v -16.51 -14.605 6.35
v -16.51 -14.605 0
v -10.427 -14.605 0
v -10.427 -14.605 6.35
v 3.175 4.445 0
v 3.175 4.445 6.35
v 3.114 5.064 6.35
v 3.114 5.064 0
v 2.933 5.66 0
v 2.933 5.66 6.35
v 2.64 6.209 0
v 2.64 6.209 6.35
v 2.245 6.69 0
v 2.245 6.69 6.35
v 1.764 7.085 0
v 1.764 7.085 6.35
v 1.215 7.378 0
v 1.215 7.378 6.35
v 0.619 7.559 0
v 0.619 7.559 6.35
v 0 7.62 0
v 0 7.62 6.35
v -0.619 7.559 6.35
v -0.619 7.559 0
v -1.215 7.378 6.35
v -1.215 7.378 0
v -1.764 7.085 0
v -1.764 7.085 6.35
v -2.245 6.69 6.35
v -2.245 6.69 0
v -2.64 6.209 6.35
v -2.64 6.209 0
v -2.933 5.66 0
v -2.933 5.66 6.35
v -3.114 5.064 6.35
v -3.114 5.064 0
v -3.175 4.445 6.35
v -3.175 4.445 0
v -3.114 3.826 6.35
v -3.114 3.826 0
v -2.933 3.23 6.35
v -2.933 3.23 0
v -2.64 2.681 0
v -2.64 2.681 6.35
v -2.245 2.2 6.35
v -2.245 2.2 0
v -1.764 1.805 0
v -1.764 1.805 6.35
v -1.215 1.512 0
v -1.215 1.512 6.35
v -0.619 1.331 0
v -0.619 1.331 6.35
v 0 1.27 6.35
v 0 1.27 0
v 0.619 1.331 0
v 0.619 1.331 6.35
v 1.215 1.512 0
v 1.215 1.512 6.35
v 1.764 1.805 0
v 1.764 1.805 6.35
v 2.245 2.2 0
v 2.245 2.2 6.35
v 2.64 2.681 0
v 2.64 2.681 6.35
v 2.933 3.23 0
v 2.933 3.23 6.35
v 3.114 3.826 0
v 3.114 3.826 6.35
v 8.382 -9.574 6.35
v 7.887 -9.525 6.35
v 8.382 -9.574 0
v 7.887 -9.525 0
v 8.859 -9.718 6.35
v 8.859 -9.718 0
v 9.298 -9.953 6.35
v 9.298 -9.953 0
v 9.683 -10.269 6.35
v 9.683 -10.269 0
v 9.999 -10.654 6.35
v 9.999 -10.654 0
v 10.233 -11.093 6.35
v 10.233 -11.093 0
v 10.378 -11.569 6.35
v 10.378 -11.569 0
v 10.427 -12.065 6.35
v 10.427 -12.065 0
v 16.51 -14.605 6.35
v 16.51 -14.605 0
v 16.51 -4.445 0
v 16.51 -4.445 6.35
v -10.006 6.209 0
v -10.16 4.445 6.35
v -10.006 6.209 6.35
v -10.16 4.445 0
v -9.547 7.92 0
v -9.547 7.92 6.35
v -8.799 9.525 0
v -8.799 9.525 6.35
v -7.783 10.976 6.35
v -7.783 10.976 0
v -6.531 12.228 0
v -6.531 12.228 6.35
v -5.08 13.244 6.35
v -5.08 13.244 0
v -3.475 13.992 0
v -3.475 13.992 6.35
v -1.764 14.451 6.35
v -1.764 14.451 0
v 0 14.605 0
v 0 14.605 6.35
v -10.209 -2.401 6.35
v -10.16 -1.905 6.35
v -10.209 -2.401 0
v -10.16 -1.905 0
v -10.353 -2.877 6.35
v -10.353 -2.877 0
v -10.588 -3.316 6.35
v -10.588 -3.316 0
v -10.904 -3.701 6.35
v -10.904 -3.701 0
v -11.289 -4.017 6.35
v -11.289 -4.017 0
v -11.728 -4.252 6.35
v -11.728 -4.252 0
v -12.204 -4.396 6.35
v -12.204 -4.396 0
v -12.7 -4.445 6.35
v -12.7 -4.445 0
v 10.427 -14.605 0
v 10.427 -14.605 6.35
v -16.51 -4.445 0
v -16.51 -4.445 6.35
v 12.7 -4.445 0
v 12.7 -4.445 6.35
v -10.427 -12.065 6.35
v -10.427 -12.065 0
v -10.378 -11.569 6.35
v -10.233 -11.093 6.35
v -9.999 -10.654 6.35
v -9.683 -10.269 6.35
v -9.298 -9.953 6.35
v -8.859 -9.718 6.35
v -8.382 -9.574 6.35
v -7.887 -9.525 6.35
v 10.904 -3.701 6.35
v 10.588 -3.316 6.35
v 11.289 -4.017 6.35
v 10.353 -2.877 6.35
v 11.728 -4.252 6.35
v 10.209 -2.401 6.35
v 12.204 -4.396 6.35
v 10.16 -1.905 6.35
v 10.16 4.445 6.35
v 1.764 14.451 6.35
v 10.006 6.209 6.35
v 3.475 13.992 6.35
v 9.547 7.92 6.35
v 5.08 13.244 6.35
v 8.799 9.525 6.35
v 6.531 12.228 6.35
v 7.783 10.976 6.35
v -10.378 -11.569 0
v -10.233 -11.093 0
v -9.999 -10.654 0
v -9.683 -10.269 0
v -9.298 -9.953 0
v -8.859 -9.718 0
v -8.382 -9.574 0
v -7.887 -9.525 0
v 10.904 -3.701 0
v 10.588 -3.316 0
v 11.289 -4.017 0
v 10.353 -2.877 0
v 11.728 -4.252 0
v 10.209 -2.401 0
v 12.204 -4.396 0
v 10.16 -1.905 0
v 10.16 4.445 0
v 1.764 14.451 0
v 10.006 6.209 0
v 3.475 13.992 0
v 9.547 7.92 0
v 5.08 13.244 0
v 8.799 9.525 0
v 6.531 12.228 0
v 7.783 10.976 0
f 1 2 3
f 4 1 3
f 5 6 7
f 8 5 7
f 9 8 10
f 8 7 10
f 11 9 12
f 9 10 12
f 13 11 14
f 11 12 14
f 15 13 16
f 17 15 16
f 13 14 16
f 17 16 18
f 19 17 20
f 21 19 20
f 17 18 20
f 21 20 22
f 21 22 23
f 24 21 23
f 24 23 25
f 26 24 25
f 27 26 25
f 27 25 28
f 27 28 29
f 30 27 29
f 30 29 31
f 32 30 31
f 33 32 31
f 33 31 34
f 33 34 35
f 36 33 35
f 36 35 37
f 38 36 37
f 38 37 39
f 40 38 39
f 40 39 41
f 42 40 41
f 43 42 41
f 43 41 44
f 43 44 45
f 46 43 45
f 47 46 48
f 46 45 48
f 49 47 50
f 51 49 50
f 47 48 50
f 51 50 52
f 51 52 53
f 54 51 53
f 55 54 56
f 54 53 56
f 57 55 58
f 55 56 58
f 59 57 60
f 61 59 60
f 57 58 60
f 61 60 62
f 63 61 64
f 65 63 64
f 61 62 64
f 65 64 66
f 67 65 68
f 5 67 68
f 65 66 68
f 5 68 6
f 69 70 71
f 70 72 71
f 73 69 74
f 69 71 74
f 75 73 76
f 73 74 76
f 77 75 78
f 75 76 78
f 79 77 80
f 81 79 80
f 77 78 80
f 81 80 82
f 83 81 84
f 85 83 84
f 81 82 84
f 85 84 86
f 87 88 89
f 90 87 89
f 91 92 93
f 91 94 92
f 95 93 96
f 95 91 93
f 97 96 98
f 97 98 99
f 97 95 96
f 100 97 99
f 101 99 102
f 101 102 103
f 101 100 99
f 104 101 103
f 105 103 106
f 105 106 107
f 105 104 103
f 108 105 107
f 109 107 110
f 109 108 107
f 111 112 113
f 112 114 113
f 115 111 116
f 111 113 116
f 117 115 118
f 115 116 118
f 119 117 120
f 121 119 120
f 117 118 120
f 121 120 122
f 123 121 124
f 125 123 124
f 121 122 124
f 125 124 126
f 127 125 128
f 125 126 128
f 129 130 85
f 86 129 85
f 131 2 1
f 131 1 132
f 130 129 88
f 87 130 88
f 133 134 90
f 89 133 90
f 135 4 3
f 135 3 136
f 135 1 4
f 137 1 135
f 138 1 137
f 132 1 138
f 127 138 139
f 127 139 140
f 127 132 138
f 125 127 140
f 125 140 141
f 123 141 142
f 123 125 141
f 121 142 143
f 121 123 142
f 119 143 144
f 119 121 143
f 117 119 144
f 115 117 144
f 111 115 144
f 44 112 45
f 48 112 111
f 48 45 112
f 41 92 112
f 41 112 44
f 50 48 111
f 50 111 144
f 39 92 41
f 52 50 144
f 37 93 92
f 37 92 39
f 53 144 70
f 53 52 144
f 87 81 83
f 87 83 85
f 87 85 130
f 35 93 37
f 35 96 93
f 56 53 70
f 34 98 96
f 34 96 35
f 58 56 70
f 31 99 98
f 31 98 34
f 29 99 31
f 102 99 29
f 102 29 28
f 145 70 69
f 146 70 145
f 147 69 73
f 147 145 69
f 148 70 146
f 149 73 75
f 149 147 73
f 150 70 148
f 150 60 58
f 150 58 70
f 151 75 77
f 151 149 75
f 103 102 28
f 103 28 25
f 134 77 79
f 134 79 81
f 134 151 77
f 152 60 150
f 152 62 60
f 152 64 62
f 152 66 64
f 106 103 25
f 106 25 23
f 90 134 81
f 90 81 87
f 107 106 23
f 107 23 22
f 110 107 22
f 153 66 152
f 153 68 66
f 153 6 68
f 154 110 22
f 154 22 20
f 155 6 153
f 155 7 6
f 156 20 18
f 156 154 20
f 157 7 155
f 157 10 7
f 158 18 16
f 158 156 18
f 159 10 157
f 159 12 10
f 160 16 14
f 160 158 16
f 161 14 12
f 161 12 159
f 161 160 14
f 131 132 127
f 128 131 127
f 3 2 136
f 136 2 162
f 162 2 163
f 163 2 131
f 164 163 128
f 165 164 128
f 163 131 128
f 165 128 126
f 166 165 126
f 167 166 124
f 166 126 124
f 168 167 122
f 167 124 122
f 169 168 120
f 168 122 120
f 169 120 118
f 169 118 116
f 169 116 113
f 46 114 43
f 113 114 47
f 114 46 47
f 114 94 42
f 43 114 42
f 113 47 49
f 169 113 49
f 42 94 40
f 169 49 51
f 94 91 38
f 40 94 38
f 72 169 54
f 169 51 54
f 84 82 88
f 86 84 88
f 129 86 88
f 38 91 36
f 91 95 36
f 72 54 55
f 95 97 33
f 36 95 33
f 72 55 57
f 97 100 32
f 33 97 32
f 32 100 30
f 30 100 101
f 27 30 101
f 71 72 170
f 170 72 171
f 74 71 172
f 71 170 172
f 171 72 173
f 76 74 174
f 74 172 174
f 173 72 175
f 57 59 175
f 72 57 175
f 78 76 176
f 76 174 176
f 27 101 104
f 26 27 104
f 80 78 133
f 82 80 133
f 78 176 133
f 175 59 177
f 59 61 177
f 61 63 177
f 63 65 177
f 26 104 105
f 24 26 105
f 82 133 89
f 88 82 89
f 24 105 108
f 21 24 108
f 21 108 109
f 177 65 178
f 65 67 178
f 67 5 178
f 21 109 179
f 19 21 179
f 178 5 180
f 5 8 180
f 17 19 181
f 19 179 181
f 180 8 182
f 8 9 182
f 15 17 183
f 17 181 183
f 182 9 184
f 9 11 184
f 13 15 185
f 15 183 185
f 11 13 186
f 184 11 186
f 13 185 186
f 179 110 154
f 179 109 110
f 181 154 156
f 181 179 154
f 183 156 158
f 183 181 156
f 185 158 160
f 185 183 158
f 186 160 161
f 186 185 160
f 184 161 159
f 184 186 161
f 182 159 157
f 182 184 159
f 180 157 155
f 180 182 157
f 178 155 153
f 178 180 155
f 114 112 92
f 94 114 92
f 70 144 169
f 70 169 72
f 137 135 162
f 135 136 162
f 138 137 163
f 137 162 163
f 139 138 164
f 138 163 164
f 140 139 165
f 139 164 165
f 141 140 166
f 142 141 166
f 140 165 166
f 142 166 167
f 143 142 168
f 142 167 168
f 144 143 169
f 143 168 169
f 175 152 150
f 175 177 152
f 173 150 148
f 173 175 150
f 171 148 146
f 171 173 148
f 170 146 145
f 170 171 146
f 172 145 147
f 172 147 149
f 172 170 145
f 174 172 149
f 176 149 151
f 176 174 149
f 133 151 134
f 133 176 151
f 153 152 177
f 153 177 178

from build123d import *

# Parameters (mm, degrees)
SKETCH1_W           = 33.02
SKETCH1_H           = 29.21
BOSS_EXTRUDE1_DEPTH = 6.35
CUT_EXTRUDE1_REACH  = 24.939
SKETCH3_R           = 3.175
SKETCH3_W           = 6.35
SKETCH3_H           = 19.05
SKETCH3_W_2         = 20.8534
SKETCH3_H_2         = 5.08
FILLET1_R           = 10.16
FILLET2_R           = 2.54


with BuildPart() as part:
    # Sketch1 → Boss-Extrude1 (new body)
    with BuildSketch(Plane.XY):
        Rectangle(SKETCH1_W, SKETCH1_H)
    extrude(amount=BOSS_EXTRUDE1_DEPTH)

    # Sketch3 → Cut-Extrude1 (cut, up to next)
    with BuildSketch(Plane.XY.offset(6.35), mode=Mode.PRIVATE) as cut_extrude1_sk1:
        with Locations((0, 4.445)):
            Circle(SKETCH3_R)
    cut_extrude1_tool1 = extrude(cut_extrude1_sk1.sketch, amount=-CUT_EXTRUDE1_REACH, mode=Mode.PRIVATE) & part.part
    # Sketch3 → Cut-Extrude1 (cut, up to next)
    with BuildSketch(Plane.XY.offset(6.35), mode=Mode.PRIVATE) as cut_extrude1_sk2:
        with Locations((-13.335, 5.08)):
            Rectangle(SKETCH3_W, SKETCH3_H)
    cut_extrude1_tool2 = extrude(cut_extrude1_sk2.sketch, amount=-CUT_EXTRUDE1_REACH, mode=Mode.PRIVATE) & part.part
    # Sketch3 → Cut-Extrude1 (cut, up to next)
    with BuildSketch(Plane.XY.offset(6.35), mode=Mode.PRIVATE) as cut_extrude1_sk3:
        with Locations((13.335, 5.08)):
            Rectangle(SKETCH3_W, SKETCH3_H)
    cut_extrude1_tool3 = extrude(cut_extrude1_sk3.sketch, amount=-CUT_EXTRUDE1_REACH, mode=Mode.PRIVATE) & part.part
    # Sketch3 → Cut-Extrude1 (cut, up to next)
    with BuildSketch(Plane.XY.offset(6.35), mode=Mode.PRIVATE) as cut_extrude1_sk4:
        with Locations((0, -12.065)):
            Rectangle(SKETCH3_W_2, SKETCH3_H_2)
    cut_extrude1_tool4 = extrude(cut_extrude1_sk4.sketch, amount=-CUT_EXTRUDE1_REACH, mode=Mode.PRIVATE) & part.part
    add(cut_extrude1_tool1.solids().sort_by_distance((0, 4.445, 6.35))[0], mode=Mode.SUBTRACT)
    add(cut_extrude1_tool2.solids().sort_by_distance((-13.335, 5.08, 6.35))[0], mode=Mode.SUBTRACT)
    add(cut_extrude1_tool3.solids().sort_by_distance((13.335, 5.08, 6.35))[0], mode=Mode.SUBTRACT)
    add(cut_extrude1_tool4.solids().sort_by_distance((0, -12.065, 6.35))[0], mode=Mode.SUBTRACT)

    # Fillet1
    fillet1_edges = [part.edges().sort_by_distance(p)[0] for p in [
        (10.16, 14.605, 3.175),
        (-10.16, 14.605, 3.175),
    ]]
    fillet(fillet1_edges, radius=FILLET1_R - 0.0001)  # a hair under: the kernel refuses the full size

    # Fillet2
    fillet2_edges = [part.edges().sort_by_distance(p)[0] for p in [
        (10.16, -4.445, 3.175),
        (-10.4267, -9.525, 3.175),
        (10.4267, -9.525, 3.175),
        (-10.16, -4.445, 3.175),
    ]]
    fillet(fillet2_edges, radius=FILLET2_R)


solid = part.part
